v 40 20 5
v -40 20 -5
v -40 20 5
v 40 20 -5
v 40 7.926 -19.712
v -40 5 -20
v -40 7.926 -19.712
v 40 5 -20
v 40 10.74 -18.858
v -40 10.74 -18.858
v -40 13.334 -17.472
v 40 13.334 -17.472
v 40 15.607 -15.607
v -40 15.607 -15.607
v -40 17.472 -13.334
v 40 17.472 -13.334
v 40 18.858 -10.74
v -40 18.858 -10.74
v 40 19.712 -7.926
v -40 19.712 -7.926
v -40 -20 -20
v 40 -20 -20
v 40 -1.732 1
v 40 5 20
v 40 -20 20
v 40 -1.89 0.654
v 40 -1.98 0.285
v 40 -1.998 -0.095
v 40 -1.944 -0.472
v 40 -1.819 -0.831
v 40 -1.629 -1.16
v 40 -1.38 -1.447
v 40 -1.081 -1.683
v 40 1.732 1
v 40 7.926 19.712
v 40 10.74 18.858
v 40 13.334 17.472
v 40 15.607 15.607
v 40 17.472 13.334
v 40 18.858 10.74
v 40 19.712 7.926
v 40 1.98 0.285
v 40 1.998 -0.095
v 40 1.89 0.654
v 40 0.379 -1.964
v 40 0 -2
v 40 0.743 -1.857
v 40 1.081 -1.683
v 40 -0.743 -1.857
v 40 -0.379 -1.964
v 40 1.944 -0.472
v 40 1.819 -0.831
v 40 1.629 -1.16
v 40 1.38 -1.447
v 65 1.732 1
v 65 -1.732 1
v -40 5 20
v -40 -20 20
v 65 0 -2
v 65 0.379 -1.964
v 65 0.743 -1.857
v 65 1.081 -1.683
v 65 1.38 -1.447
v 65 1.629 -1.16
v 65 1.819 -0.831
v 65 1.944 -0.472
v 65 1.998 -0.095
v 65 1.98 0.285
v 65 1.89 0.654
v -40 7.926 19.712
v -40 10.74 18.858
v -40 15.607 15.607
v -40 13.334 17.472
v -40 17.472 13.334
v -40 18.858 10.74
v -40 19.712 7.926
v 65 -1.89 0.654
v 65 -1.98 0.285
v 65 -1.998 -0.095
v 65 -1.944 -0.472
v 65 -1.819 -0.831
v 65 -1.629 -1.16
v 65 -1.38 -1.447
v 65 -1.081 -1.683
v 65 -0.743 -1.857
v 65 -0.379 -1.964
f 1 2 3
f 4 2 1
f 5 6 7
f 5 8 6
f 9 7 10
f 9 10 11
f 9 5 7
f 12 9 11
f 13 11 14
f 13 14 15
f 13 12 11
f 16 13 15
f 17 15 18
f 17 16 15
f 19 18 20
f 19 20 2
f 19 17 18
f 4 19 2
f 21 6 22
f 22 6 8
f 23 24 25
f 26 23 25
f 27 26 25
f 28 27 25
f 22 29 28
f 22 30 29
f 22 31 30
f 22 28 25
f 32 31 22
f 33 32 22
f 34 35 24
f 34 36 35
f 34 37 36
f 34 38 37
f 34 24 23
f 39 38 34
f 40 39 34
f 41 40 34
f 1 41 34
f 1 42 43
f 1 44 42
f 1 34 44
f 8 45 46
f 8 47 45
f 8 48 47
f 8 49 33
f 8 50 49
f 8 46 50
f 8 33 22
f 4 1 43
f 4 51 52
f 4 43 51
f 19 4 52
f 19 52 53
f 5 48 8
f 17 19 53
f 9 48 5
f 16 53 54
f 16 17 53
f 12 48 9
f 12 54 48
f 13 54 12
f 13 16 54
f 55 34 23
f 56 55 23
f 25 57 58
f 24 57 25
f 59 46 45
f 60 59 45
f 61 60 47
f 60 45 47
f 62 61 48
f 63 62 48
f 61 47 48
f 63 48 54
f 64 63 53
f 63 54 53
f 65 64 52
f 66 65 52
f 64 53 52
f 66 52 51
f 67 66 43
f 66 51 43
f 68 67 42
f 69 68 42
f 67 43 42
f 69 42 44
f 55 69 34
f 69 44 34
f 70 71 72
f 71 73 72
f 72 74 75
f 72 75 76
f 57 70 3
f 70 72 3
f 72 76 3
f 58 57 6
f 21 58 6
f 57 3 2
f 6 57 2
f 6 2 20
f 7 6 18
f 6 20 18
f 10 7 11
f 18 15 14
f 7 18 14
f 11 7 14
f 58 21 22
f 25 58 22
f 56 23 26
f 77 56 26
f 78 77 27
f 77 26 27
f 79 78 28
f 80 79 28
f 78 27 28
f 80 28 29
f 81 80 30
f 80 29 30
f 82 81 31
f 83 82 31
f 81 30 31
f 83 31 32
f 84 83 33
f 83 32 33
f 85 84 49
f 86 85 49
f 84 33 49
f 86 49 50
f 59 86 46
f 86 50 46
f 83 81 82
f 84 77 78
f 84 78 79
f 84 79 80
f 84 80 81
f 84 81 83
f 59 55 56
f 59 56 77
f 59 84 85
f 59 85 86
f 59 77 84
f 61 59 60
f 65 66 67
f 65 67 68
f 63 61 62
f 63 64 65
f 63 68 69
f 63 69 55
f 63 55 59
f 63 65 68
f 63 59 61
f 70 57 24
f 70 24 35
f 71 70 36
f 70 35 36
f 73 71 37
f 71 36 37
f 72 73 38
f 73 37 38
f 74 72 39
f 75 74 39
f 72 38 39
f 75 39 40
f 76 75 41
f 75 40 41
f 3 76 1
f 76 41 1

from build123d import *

# Parameters (mm, degrees)
SKETCH1_W           = 80
SKETCH1_H           = 40
BOSS_EXTRUDE1_DEPTH = 20
BOSS_EXTRUDE2_START = 40
BOSS_EXTRUDE2_DEPTH = 25
FILLET1_R           = 15


with BuildPart() as part:
    # Sketch1 → Boss-Extrude1 (new, symmetric)
    with BuildSketch(Plane(origin=(0, 0, 0), x_dir=(1, 0, 0), z_dir=(0, 1, 0))):
        Rectangle(SKETCH1_W, SKETCH1_H)
    extrude(amount=BOSS_EXTRUDE1_DEPTH, both=True)

    # Sketch4 → Boss-Extrude2 (add)
    with BuildSketch(Plane(origin=(0, 0, 0), x_dir=(0, 0, -1), z_dir=(1, 0, 0)).offset(BOSS_EXTRUDE2_START)):
        with BuildLine():
            ThreePointArc((2, 0), (1, 1.732050808), (-1, 1.732050808))
            Line((-1, 1.732050808), (-1, -1.732050808))
            ThreePointArc((-1, -1.732050808), (1, -1.732050808), (2, 0))
        make_face()
    extrude(amount=BOSS_EXTRUDE2_DEPTH)

    # Fillet1
    fillet1_edges = [part.edges().sort_by_distance(p)[0] for p in [
        (0, 20, 20),
        (0, 20, -20),
    ]]
    fillet(fillet1_edges, radius=FILLET1_R)


solid = part.part
